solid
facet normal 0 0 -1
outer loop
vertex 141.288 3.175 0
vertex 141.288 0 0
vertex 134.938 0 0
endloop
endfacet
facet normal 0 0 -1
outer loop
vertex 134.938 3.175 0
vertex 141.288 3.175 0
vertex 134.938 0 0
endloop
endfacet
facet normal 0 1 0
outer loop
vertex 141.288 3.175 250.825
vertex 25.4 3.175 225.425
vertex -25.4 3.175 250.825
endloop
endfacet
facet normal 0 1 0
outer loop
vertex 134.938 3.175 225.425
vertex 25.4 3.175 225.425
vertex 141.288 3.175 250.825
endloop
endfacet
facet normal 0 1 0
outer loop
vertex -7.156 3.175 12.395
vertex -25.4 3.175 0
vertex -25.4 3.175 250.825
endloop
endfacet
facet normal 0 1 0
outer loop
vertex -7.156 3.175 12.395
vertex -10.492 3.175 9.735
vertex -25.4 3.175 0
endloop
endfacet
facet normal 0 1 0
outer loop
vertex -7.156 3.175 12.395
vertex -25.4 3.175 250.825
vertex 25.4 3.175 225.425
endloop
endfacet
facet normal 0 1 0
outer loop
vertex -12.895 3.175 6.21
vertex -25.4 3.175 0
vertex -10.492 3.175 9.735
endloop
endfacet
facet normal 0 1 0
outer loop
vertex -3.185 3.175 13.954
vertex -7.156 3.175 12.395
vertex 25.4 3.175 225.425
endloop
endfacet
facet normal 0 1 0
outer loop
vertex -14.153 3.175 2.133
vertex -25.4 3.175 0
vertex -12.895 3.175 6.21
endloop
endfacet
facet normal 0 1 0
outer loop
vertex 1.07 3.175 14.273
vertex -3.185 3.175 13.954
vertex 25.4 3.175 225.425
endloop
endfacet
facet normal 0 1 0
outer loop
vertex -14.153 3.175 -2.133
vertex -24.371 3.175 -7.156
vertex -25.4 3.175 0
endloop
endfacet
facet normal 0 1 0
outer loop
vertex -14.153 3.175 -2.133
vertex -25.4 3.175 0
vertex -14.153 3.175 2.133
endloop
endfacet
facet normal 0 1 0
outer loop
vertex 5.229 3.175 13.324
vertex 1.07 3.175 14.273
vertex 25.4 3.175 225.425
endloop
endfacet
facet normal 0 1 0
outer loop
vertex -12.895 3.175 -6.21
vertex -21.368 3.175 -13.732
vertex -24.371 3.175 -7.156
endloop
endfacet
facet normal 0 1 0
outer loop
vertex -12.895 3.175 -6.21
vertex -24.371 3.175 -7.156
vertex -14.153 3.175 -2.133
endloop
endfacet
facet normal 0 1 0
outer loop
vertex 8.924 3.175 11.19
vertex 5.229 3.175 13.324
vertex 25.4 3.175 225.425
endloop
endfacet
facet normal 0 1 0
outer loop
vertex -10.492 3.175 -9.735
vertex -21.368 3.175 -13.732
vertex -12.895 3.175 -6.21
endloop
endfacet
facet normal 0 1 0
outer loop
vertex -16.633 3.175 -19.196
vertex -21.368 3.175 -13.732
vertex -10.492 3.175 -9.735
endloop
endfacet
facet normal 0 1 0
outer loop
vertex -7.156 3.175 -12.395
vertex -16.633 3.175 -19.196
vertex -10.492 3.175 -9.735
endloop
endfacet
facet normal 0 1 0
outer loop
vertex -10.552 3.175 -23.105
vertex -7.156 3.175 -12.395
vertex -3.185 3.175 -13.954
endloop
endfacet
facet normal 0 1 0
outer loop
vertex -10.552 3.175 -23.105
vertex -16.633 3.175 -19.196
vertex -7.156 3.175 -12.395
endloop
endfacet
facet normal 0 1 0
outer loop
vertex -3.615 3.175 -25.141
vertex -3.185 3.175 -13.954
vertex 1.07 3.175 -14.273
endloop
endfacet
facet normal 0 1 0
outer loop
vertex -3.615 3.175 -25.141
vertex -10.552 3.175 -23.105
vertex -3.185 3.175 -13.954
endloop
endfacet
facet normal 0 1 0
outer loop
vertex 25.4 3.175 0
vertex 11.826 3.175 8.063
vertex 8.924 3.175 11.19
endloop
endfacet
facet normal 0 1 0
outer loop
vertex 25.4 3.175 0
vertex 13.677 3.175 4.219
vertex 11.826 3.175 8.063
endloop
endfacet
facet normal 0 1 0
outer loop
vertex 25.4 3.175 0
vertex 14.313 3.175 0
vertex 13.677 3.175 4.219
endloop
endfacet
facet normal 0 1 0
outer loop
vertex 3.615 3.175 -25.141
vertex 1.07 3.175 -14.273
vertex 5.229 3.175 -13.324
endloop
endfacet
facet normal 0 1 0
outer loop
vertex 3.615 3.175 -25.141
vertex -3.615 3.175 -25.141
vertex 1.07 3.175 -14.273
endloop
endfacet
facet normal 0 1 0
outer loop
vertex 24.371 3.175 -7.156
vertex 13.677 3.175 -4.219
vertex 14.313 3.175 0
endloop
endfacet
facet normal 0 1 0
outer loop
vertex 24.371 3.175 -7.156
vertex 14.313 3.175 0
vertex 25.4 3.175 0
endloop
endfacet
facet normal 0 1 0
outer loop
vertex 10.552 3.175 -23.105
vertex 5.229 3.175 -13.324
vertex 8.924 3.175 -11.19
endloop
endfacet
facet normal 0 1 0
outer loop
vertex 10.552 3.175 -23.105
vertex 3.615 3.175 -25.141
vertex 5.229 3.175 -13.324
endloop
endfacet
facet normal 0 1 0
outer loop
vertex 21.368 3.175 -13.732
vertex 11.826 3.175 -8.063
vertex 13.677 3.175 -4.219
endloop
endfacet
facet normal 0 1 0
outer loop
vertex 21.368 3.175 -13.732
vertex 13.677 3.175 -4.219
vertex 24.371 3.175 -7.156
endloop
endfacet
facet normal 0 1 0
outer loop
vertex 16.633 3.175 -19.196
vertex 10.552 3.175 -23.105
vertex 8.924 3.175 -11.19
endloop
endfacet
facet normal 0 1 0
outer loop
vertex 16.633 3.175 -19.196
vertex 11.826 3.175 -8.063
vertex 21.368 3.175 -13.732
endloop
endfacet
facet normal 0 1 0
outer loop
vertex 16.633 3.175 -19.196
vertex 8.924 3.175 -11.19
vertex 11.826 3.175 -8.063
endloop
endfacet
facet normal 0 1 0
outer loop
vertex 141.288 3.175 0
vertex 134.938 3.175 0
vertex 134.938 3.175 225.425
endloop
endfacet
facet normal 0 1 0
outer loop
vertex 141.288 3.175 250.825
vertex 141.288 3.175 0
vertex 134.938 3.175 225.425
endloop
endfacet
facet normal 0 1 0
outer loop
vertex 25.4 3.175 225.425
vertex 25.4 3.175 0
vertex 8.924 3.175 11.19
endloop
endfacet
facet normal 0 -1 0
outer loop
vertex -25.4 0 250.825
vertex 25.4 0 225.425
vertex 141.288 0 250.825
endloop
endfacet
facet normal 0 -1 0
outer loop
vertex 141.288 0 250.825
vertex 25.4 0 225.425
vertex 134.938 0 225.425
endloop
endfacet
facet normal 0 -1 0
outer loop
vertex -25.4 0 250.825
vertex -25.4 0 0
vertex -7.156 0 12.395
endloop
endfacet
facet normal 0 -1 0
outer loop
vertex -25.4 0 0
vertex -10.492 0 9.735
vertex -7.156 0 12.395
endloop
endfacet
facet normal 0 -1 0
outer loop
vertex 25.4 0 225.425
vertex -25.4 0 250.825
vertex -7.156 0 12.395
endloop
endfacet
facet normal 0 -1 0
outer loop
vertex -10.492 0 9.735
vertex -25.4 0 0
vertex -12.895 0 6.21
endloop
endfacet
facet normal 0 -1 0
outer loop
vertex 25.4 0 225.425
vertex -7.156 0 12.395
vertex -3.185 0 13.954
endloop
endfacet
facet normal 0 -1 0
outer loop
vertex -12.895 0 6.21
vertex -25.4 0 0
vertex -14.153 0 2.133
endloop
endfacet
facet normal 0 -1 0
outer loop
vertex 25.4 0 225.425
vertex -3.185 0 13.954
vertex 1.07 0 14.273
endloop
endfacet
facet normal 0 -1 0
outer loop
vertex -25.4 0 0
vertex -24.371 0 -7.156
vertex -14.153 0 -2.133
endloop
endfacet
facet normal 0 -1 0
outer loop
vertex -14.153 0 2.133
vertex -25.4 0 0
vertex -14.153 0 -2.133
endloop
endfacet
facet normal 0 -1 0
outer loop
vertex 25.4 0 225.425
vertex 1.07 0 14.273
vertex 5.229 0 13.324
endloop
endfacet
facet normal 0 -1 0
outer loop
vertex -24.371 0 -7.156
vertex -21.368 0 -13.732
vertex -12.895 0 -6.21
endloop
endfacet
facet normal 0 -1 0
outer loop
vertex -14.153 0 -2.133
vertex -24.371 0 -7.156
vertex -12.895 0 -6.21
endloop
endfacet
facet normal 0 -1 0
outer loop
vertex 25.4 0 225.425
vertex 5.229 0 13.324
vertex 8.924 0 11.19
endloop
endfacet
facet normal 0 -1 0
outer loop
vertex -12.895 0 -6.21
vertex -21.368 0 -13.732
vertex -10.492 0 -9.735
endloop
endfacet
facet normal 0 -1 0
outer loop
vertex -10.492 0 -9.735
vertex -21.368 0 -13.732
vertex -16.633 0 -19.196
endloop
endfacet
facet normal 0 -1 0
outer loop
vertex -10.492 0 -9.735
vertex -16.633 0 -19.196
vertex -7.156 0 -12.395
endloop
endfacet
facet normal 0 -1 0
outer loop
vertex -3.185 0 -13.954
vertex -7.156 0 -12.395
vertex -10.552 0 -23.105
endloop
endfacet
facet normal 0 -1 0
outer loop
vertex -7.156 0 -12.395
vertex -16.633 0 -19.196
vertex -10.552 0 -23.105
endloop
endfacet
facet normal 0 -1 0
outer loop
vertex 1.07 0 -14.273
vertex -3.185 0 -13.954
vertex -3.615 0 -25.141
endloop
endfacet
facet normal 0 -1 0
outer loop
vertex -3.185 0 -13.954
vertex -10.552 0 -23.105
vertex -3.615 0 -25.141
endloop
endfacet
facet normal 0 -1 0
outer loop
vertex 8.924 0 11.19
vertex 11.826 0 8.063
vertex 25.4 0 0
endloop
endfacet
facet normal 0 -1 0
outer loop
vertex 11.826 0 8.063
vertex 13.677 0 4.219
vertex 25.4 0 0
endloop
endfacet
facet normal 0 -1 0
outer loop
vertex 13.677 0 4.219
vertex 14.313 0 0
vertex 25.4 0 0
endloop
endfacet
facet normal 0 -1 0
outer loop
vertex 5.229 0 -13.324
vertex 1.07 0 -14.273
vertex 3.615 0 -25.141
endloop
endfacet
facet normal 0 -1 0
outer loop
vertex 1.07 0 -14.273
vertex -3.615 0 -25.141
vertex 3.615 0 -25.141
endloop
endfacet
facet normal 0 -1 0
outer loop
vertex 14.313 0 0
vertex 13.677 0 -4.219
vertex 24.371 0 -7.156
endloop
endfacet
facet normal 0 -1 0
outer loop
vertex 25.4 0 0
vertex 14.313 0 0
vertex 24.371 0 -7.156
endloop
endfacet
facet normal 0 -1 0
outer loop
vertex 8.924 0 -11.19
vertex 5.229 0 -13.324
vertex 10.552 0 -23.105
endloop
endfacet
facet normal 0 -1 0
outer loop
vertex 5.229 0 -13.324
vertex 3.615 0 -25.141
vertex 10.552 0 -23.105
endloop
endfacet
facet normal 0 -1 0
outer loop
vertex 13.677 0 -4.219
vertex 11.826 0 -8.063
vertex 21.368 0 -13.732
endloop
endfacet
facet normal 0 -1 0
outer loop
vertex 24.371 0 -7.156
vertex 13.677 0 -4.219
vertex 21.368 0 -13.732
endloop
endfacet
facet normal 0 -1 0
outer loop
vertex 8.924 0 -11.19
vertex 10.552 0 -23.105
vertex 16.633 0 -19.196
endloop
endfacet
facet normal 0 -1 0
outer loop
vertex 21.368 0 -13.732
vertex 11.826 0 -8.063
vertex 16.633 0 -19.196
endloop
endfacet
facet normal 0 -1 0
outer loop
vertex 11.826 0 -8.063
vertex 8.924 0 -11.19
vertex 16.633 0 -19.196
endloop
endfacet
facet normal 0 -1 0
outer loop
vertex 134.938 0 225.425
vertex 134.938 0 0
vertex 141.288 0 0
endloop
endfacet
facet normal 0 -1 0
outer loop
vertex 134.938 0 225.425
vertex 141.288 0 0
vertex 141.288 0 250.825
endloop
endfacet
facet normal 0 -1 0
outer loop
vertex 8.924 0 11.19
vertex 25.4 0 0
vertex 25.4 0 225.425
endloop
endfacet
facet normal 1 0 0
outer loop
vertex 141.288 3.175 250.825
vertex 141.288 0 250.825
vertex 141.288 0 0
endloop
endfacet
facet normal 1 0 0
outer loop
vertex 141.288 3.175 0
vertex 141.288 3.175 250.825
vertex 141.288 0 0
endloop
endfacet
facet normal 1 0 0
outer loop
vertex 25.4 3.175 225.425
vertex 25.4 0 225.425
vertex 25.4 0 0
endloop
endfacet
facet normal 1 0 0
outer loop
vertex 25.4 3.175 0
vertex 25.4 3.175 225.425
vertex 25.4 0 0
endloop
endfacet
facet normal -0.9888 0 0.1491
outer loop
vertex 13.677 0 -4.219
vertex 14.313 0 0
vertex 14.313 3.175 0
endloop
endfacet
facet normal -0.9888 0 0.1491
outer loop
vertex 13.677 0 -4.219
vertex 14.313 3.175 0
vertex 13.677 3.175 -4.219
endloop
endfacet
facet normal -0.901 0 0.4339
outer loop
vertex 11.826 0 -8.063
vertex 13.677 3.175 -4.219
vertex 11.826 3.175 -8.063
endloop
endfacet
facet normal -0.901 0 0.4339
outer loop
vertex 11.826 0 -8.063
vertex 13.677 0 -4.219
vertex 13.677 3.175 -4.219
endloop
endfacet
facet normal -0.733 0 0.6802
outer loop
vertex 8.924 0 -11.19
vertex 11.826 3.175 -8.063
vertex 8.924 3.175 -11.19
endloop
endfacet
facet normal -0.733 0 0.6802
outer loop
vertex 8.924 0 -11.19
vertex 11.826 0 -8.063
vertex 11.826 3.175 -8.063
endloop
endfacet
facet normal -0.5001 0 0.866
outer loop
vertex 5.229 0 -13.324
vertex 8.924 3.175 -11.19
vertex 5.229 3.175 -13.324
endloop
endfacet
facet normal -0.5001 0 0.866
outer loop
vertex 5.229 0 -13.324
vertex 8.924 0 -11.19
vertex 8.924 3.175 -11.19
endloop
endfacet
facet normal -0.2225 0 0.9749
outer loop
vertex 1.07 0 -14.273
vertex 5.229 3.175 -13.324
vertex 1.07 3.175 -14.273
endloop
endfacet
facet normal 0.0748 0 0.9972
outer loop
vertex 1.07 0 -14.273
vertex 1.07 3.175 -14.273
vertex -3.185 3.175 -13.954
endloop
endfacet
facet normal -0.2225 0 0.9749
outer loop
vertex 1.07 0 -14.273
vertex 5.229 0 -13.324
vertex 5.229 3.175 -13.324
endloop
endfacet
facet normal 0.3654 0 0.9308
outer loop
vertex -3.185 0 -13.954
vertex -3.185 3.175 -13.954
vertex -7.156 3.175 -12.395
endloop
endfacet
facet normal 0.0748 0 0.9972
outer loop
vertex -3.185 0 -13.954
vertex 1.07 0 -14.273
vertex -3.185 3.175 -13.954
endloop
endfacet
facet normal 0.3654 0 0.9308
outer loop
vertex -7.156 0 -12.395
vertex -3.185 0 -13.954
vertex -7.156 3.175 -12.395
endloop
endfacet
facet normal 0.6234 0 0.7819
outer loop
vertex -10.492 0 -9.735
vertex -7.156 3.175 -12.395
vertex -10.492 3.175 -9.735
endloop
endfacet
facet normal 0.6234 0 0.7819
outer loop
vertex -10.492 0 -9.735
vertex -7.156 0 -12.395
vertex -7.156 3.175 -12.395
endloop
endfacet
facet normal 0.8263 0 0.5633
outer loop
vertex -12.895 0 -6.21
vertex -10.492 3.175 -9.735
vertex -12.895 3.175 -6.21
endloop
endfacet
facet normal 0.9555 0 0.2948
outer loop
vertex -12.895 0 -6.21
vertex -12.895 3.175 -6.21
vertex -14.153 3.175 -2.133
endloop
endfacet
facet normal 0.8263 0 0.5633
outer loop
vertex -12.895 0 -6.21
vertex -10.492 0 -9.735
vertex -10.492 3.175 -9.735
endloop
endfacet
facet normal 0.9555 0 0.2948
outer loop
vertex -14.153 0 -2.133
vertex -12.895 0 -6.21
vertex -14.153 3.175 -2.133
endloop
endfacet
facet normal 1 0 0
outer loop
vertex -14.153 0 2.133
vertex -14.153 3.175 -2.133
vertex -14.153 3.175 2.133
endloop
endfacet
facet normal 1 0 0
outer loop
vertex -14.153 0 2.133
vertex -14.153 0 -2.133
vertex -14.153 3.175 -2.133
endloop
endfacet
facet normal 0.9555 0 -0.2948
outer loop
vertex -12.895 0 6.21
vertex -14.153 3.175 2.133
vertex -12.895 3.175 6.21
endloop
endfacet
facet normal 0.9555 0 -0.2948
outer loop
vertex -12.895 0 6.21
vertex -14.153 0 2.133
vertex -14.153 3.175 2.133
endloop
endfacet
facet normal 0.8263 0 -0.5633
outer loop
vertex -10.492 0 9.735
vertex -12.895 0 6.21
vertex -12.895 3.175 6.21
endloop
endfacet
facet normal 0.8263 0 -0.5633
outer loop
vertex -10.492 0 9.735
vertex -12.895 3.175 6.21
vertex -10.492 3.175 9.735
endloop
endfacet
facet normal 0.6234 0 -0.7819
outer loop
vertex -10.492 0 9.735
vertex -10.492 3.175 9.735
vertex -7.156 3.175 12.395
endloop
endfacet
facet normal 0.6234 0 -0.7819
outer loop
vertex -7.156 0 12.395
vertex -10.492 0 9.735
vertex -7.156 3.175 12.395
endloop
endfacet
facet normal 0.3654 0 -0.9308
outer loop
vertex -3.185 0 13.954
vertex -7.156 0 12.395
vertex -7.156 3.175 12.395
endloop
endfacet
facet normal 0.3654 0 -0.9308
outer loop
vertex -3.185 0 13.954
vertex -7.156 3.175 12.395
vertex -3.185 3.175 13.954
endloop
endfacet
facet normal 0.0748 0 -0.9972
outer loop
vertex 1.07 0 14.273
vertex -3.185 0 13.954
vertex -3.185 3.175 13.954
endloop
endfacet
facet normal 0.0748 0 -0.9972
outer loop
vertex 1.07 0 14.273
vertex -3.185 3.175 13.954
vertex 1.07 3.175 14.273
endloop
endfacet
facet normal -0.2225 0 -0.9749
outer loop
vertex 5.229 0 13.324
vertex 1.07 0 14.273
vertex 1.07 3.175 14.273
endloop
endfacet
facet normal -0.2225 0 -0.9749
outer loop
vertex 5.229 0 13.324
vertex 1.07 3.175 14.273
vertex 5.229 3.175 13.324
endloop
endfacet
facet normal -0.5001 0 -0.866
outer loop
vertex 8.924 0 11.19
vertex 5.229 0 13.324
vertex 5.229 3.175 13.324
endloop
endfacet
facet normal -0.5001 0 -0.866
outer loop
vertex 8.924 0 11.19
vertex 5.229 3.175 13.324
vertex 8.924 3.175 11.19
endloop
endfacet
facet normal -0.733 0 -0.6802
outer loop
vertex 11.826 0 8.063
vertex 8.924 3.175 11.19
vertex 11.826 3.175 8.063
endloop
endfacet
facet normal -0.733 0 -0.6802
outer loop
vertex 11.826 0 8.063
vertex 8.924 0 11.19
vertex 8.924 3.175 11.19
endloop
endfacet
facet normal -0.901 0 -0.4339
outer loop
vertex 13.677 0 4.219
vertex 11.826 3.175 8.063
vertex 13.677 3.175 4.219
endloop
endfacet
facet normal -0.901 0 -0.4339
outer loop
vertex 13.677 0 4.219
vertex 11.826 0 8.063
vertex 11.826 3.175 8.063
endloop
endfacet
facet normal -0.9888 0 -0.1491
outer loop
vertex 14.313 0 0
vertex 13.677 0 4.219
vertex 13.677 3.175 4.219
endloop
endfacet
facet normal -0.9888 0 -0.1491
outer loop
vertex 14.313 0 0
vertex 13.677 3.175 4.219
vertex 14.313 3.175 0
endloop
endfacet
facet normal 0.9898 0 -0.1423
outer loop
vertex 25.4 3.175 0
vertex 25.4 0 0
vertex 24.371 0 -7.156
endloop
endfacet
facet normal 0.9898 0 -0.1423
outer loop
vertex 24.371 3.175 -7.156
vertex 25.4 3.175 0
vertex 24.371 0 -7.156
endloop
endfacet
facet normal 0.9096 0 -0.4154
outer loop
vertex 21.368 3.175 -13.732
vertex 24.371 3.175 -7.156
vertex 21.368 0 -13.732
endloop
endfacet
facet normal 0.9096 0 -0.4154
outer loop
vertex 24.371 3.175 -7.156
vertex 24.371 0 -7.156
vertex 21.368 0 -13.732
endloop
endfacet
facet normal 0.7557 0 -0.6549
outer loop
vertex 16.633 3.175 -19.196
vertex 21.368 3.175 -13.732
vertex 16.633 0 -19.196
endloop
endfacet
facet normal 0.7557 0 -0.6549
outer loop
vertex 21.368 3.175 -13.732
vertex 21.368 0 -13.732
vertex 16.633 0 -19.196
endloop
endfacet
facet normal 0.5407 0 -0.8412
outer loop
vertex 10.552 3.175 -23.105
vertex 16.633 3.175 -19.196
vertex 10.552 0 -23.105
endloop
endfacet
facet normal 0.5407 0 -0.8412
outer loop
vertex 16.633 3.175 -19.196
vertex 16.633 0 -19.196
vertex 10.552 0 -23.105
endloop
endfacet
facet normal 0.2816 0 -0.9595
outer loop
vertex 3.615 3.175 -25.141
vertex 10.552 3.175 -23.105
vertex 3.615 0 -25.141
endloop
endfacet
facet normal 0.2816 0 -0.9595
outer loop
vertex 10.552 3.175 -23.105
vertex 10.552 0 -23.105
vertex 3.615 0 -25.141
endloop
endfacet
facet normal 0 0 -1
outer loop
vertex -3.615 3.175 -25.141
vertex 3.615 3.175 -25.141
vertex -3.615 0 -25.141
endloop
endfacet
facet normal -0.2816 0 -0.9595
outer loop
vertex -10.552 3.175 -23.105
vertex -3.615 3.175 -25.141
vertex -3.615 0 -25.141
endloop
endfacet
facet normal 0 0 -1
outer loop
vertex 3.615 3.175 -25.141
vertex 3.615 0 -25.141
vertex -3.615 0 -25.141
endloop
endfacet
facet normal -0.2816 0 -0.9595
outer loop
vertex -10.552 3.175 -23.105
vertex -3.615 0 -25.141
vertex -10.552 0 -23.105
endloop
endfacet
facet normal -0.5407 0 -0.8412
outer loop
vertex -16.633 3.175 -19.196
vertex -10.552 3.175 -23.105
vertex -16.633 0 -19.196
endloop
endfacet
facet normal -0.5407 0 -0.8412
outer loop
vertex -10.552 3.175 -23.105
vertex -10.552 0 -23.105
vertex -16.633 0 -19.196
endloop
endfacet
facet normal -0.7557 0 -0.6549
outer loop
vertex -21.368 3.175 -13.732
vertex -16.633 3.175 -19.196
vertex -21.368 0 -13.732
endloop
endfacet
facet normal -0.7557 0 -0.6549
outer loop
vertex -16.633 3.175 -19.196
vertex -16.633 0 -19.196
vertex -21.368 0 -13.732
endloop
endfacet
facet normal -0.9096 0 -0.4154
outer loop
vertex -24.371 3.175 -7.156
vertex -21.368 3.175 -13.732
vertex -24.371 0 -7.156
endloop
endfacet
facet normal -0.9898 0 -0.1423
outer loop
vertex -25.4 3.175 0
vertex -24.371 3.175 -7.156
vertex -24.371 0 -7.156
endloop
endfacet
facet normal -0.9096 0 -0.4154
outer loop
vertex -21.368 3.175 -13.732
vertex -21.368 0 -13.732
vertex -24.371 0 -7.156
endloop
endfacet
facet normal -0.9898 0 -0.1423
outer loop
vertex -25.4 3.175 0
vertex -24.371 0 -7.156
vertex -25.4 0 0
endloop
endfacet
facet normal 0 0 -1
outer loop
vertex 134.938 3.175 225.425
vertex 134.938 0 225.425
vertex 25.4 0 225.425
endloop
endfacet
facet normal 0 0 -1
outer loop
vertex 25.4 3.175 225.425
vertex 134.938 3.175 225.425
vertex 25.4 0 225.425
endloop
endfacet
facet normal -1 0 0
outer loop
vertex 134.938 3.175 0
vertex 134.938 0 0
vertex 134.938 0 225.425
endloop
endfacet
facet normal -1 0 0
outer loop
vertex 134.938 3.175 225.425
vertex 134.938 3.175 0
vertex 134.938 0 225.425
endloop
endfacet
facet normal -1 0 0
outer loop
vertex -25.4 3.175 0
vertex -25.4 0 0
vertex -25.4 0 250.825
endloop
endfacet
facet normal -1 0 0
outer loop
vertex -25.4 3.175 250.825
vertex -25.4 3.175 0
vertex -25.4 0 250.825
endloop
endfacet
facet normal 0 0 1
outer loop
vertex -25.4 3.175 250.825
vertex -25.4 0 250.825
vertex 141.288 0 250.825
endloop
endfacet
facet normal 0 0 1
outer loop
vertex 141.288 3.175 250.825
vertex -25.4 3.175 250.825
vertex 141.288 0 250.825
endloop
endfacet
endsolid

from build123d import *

# Parameters (mm, degrees)
SKETCH1_R           = 14.3129
BOSS_EXTRUDE1_DEPTH = 3.175


with BuildPart() as part:
    # Sketch1 → Boss-Extrude1 (new body)
    with BuildSketch(Plane(origin=(0, 0, 0), x_dir=(1, 0, 0), z_dir=(0, 1, 0))):
        with BuildLine():
            Line((-25.4, 0), (-25.4, -250.825))
            Line((-25.4, -250.825), (141.2875, -250.825))
            Line((141.2875, -250.825), (141.2875, 0))
            Line((141.2875, 0), (134.9375, 0))
            Line((134.9375, 0), (134.9375, -225.425))
            Line((134.9375, -225.425), (25.4, -225.425))
            Line((25.4, -225.425), (25.4, 0))
            ThreePointArc((25.4, 0), (0, 25.4), (-25.4, 0))
        make_face()
        Circle(SKETCH1_R, mode=Mode.SUBTRACT)
    extrude(amount=BOSS_EXTRUDE1_DEPTH)


solid = part.part
